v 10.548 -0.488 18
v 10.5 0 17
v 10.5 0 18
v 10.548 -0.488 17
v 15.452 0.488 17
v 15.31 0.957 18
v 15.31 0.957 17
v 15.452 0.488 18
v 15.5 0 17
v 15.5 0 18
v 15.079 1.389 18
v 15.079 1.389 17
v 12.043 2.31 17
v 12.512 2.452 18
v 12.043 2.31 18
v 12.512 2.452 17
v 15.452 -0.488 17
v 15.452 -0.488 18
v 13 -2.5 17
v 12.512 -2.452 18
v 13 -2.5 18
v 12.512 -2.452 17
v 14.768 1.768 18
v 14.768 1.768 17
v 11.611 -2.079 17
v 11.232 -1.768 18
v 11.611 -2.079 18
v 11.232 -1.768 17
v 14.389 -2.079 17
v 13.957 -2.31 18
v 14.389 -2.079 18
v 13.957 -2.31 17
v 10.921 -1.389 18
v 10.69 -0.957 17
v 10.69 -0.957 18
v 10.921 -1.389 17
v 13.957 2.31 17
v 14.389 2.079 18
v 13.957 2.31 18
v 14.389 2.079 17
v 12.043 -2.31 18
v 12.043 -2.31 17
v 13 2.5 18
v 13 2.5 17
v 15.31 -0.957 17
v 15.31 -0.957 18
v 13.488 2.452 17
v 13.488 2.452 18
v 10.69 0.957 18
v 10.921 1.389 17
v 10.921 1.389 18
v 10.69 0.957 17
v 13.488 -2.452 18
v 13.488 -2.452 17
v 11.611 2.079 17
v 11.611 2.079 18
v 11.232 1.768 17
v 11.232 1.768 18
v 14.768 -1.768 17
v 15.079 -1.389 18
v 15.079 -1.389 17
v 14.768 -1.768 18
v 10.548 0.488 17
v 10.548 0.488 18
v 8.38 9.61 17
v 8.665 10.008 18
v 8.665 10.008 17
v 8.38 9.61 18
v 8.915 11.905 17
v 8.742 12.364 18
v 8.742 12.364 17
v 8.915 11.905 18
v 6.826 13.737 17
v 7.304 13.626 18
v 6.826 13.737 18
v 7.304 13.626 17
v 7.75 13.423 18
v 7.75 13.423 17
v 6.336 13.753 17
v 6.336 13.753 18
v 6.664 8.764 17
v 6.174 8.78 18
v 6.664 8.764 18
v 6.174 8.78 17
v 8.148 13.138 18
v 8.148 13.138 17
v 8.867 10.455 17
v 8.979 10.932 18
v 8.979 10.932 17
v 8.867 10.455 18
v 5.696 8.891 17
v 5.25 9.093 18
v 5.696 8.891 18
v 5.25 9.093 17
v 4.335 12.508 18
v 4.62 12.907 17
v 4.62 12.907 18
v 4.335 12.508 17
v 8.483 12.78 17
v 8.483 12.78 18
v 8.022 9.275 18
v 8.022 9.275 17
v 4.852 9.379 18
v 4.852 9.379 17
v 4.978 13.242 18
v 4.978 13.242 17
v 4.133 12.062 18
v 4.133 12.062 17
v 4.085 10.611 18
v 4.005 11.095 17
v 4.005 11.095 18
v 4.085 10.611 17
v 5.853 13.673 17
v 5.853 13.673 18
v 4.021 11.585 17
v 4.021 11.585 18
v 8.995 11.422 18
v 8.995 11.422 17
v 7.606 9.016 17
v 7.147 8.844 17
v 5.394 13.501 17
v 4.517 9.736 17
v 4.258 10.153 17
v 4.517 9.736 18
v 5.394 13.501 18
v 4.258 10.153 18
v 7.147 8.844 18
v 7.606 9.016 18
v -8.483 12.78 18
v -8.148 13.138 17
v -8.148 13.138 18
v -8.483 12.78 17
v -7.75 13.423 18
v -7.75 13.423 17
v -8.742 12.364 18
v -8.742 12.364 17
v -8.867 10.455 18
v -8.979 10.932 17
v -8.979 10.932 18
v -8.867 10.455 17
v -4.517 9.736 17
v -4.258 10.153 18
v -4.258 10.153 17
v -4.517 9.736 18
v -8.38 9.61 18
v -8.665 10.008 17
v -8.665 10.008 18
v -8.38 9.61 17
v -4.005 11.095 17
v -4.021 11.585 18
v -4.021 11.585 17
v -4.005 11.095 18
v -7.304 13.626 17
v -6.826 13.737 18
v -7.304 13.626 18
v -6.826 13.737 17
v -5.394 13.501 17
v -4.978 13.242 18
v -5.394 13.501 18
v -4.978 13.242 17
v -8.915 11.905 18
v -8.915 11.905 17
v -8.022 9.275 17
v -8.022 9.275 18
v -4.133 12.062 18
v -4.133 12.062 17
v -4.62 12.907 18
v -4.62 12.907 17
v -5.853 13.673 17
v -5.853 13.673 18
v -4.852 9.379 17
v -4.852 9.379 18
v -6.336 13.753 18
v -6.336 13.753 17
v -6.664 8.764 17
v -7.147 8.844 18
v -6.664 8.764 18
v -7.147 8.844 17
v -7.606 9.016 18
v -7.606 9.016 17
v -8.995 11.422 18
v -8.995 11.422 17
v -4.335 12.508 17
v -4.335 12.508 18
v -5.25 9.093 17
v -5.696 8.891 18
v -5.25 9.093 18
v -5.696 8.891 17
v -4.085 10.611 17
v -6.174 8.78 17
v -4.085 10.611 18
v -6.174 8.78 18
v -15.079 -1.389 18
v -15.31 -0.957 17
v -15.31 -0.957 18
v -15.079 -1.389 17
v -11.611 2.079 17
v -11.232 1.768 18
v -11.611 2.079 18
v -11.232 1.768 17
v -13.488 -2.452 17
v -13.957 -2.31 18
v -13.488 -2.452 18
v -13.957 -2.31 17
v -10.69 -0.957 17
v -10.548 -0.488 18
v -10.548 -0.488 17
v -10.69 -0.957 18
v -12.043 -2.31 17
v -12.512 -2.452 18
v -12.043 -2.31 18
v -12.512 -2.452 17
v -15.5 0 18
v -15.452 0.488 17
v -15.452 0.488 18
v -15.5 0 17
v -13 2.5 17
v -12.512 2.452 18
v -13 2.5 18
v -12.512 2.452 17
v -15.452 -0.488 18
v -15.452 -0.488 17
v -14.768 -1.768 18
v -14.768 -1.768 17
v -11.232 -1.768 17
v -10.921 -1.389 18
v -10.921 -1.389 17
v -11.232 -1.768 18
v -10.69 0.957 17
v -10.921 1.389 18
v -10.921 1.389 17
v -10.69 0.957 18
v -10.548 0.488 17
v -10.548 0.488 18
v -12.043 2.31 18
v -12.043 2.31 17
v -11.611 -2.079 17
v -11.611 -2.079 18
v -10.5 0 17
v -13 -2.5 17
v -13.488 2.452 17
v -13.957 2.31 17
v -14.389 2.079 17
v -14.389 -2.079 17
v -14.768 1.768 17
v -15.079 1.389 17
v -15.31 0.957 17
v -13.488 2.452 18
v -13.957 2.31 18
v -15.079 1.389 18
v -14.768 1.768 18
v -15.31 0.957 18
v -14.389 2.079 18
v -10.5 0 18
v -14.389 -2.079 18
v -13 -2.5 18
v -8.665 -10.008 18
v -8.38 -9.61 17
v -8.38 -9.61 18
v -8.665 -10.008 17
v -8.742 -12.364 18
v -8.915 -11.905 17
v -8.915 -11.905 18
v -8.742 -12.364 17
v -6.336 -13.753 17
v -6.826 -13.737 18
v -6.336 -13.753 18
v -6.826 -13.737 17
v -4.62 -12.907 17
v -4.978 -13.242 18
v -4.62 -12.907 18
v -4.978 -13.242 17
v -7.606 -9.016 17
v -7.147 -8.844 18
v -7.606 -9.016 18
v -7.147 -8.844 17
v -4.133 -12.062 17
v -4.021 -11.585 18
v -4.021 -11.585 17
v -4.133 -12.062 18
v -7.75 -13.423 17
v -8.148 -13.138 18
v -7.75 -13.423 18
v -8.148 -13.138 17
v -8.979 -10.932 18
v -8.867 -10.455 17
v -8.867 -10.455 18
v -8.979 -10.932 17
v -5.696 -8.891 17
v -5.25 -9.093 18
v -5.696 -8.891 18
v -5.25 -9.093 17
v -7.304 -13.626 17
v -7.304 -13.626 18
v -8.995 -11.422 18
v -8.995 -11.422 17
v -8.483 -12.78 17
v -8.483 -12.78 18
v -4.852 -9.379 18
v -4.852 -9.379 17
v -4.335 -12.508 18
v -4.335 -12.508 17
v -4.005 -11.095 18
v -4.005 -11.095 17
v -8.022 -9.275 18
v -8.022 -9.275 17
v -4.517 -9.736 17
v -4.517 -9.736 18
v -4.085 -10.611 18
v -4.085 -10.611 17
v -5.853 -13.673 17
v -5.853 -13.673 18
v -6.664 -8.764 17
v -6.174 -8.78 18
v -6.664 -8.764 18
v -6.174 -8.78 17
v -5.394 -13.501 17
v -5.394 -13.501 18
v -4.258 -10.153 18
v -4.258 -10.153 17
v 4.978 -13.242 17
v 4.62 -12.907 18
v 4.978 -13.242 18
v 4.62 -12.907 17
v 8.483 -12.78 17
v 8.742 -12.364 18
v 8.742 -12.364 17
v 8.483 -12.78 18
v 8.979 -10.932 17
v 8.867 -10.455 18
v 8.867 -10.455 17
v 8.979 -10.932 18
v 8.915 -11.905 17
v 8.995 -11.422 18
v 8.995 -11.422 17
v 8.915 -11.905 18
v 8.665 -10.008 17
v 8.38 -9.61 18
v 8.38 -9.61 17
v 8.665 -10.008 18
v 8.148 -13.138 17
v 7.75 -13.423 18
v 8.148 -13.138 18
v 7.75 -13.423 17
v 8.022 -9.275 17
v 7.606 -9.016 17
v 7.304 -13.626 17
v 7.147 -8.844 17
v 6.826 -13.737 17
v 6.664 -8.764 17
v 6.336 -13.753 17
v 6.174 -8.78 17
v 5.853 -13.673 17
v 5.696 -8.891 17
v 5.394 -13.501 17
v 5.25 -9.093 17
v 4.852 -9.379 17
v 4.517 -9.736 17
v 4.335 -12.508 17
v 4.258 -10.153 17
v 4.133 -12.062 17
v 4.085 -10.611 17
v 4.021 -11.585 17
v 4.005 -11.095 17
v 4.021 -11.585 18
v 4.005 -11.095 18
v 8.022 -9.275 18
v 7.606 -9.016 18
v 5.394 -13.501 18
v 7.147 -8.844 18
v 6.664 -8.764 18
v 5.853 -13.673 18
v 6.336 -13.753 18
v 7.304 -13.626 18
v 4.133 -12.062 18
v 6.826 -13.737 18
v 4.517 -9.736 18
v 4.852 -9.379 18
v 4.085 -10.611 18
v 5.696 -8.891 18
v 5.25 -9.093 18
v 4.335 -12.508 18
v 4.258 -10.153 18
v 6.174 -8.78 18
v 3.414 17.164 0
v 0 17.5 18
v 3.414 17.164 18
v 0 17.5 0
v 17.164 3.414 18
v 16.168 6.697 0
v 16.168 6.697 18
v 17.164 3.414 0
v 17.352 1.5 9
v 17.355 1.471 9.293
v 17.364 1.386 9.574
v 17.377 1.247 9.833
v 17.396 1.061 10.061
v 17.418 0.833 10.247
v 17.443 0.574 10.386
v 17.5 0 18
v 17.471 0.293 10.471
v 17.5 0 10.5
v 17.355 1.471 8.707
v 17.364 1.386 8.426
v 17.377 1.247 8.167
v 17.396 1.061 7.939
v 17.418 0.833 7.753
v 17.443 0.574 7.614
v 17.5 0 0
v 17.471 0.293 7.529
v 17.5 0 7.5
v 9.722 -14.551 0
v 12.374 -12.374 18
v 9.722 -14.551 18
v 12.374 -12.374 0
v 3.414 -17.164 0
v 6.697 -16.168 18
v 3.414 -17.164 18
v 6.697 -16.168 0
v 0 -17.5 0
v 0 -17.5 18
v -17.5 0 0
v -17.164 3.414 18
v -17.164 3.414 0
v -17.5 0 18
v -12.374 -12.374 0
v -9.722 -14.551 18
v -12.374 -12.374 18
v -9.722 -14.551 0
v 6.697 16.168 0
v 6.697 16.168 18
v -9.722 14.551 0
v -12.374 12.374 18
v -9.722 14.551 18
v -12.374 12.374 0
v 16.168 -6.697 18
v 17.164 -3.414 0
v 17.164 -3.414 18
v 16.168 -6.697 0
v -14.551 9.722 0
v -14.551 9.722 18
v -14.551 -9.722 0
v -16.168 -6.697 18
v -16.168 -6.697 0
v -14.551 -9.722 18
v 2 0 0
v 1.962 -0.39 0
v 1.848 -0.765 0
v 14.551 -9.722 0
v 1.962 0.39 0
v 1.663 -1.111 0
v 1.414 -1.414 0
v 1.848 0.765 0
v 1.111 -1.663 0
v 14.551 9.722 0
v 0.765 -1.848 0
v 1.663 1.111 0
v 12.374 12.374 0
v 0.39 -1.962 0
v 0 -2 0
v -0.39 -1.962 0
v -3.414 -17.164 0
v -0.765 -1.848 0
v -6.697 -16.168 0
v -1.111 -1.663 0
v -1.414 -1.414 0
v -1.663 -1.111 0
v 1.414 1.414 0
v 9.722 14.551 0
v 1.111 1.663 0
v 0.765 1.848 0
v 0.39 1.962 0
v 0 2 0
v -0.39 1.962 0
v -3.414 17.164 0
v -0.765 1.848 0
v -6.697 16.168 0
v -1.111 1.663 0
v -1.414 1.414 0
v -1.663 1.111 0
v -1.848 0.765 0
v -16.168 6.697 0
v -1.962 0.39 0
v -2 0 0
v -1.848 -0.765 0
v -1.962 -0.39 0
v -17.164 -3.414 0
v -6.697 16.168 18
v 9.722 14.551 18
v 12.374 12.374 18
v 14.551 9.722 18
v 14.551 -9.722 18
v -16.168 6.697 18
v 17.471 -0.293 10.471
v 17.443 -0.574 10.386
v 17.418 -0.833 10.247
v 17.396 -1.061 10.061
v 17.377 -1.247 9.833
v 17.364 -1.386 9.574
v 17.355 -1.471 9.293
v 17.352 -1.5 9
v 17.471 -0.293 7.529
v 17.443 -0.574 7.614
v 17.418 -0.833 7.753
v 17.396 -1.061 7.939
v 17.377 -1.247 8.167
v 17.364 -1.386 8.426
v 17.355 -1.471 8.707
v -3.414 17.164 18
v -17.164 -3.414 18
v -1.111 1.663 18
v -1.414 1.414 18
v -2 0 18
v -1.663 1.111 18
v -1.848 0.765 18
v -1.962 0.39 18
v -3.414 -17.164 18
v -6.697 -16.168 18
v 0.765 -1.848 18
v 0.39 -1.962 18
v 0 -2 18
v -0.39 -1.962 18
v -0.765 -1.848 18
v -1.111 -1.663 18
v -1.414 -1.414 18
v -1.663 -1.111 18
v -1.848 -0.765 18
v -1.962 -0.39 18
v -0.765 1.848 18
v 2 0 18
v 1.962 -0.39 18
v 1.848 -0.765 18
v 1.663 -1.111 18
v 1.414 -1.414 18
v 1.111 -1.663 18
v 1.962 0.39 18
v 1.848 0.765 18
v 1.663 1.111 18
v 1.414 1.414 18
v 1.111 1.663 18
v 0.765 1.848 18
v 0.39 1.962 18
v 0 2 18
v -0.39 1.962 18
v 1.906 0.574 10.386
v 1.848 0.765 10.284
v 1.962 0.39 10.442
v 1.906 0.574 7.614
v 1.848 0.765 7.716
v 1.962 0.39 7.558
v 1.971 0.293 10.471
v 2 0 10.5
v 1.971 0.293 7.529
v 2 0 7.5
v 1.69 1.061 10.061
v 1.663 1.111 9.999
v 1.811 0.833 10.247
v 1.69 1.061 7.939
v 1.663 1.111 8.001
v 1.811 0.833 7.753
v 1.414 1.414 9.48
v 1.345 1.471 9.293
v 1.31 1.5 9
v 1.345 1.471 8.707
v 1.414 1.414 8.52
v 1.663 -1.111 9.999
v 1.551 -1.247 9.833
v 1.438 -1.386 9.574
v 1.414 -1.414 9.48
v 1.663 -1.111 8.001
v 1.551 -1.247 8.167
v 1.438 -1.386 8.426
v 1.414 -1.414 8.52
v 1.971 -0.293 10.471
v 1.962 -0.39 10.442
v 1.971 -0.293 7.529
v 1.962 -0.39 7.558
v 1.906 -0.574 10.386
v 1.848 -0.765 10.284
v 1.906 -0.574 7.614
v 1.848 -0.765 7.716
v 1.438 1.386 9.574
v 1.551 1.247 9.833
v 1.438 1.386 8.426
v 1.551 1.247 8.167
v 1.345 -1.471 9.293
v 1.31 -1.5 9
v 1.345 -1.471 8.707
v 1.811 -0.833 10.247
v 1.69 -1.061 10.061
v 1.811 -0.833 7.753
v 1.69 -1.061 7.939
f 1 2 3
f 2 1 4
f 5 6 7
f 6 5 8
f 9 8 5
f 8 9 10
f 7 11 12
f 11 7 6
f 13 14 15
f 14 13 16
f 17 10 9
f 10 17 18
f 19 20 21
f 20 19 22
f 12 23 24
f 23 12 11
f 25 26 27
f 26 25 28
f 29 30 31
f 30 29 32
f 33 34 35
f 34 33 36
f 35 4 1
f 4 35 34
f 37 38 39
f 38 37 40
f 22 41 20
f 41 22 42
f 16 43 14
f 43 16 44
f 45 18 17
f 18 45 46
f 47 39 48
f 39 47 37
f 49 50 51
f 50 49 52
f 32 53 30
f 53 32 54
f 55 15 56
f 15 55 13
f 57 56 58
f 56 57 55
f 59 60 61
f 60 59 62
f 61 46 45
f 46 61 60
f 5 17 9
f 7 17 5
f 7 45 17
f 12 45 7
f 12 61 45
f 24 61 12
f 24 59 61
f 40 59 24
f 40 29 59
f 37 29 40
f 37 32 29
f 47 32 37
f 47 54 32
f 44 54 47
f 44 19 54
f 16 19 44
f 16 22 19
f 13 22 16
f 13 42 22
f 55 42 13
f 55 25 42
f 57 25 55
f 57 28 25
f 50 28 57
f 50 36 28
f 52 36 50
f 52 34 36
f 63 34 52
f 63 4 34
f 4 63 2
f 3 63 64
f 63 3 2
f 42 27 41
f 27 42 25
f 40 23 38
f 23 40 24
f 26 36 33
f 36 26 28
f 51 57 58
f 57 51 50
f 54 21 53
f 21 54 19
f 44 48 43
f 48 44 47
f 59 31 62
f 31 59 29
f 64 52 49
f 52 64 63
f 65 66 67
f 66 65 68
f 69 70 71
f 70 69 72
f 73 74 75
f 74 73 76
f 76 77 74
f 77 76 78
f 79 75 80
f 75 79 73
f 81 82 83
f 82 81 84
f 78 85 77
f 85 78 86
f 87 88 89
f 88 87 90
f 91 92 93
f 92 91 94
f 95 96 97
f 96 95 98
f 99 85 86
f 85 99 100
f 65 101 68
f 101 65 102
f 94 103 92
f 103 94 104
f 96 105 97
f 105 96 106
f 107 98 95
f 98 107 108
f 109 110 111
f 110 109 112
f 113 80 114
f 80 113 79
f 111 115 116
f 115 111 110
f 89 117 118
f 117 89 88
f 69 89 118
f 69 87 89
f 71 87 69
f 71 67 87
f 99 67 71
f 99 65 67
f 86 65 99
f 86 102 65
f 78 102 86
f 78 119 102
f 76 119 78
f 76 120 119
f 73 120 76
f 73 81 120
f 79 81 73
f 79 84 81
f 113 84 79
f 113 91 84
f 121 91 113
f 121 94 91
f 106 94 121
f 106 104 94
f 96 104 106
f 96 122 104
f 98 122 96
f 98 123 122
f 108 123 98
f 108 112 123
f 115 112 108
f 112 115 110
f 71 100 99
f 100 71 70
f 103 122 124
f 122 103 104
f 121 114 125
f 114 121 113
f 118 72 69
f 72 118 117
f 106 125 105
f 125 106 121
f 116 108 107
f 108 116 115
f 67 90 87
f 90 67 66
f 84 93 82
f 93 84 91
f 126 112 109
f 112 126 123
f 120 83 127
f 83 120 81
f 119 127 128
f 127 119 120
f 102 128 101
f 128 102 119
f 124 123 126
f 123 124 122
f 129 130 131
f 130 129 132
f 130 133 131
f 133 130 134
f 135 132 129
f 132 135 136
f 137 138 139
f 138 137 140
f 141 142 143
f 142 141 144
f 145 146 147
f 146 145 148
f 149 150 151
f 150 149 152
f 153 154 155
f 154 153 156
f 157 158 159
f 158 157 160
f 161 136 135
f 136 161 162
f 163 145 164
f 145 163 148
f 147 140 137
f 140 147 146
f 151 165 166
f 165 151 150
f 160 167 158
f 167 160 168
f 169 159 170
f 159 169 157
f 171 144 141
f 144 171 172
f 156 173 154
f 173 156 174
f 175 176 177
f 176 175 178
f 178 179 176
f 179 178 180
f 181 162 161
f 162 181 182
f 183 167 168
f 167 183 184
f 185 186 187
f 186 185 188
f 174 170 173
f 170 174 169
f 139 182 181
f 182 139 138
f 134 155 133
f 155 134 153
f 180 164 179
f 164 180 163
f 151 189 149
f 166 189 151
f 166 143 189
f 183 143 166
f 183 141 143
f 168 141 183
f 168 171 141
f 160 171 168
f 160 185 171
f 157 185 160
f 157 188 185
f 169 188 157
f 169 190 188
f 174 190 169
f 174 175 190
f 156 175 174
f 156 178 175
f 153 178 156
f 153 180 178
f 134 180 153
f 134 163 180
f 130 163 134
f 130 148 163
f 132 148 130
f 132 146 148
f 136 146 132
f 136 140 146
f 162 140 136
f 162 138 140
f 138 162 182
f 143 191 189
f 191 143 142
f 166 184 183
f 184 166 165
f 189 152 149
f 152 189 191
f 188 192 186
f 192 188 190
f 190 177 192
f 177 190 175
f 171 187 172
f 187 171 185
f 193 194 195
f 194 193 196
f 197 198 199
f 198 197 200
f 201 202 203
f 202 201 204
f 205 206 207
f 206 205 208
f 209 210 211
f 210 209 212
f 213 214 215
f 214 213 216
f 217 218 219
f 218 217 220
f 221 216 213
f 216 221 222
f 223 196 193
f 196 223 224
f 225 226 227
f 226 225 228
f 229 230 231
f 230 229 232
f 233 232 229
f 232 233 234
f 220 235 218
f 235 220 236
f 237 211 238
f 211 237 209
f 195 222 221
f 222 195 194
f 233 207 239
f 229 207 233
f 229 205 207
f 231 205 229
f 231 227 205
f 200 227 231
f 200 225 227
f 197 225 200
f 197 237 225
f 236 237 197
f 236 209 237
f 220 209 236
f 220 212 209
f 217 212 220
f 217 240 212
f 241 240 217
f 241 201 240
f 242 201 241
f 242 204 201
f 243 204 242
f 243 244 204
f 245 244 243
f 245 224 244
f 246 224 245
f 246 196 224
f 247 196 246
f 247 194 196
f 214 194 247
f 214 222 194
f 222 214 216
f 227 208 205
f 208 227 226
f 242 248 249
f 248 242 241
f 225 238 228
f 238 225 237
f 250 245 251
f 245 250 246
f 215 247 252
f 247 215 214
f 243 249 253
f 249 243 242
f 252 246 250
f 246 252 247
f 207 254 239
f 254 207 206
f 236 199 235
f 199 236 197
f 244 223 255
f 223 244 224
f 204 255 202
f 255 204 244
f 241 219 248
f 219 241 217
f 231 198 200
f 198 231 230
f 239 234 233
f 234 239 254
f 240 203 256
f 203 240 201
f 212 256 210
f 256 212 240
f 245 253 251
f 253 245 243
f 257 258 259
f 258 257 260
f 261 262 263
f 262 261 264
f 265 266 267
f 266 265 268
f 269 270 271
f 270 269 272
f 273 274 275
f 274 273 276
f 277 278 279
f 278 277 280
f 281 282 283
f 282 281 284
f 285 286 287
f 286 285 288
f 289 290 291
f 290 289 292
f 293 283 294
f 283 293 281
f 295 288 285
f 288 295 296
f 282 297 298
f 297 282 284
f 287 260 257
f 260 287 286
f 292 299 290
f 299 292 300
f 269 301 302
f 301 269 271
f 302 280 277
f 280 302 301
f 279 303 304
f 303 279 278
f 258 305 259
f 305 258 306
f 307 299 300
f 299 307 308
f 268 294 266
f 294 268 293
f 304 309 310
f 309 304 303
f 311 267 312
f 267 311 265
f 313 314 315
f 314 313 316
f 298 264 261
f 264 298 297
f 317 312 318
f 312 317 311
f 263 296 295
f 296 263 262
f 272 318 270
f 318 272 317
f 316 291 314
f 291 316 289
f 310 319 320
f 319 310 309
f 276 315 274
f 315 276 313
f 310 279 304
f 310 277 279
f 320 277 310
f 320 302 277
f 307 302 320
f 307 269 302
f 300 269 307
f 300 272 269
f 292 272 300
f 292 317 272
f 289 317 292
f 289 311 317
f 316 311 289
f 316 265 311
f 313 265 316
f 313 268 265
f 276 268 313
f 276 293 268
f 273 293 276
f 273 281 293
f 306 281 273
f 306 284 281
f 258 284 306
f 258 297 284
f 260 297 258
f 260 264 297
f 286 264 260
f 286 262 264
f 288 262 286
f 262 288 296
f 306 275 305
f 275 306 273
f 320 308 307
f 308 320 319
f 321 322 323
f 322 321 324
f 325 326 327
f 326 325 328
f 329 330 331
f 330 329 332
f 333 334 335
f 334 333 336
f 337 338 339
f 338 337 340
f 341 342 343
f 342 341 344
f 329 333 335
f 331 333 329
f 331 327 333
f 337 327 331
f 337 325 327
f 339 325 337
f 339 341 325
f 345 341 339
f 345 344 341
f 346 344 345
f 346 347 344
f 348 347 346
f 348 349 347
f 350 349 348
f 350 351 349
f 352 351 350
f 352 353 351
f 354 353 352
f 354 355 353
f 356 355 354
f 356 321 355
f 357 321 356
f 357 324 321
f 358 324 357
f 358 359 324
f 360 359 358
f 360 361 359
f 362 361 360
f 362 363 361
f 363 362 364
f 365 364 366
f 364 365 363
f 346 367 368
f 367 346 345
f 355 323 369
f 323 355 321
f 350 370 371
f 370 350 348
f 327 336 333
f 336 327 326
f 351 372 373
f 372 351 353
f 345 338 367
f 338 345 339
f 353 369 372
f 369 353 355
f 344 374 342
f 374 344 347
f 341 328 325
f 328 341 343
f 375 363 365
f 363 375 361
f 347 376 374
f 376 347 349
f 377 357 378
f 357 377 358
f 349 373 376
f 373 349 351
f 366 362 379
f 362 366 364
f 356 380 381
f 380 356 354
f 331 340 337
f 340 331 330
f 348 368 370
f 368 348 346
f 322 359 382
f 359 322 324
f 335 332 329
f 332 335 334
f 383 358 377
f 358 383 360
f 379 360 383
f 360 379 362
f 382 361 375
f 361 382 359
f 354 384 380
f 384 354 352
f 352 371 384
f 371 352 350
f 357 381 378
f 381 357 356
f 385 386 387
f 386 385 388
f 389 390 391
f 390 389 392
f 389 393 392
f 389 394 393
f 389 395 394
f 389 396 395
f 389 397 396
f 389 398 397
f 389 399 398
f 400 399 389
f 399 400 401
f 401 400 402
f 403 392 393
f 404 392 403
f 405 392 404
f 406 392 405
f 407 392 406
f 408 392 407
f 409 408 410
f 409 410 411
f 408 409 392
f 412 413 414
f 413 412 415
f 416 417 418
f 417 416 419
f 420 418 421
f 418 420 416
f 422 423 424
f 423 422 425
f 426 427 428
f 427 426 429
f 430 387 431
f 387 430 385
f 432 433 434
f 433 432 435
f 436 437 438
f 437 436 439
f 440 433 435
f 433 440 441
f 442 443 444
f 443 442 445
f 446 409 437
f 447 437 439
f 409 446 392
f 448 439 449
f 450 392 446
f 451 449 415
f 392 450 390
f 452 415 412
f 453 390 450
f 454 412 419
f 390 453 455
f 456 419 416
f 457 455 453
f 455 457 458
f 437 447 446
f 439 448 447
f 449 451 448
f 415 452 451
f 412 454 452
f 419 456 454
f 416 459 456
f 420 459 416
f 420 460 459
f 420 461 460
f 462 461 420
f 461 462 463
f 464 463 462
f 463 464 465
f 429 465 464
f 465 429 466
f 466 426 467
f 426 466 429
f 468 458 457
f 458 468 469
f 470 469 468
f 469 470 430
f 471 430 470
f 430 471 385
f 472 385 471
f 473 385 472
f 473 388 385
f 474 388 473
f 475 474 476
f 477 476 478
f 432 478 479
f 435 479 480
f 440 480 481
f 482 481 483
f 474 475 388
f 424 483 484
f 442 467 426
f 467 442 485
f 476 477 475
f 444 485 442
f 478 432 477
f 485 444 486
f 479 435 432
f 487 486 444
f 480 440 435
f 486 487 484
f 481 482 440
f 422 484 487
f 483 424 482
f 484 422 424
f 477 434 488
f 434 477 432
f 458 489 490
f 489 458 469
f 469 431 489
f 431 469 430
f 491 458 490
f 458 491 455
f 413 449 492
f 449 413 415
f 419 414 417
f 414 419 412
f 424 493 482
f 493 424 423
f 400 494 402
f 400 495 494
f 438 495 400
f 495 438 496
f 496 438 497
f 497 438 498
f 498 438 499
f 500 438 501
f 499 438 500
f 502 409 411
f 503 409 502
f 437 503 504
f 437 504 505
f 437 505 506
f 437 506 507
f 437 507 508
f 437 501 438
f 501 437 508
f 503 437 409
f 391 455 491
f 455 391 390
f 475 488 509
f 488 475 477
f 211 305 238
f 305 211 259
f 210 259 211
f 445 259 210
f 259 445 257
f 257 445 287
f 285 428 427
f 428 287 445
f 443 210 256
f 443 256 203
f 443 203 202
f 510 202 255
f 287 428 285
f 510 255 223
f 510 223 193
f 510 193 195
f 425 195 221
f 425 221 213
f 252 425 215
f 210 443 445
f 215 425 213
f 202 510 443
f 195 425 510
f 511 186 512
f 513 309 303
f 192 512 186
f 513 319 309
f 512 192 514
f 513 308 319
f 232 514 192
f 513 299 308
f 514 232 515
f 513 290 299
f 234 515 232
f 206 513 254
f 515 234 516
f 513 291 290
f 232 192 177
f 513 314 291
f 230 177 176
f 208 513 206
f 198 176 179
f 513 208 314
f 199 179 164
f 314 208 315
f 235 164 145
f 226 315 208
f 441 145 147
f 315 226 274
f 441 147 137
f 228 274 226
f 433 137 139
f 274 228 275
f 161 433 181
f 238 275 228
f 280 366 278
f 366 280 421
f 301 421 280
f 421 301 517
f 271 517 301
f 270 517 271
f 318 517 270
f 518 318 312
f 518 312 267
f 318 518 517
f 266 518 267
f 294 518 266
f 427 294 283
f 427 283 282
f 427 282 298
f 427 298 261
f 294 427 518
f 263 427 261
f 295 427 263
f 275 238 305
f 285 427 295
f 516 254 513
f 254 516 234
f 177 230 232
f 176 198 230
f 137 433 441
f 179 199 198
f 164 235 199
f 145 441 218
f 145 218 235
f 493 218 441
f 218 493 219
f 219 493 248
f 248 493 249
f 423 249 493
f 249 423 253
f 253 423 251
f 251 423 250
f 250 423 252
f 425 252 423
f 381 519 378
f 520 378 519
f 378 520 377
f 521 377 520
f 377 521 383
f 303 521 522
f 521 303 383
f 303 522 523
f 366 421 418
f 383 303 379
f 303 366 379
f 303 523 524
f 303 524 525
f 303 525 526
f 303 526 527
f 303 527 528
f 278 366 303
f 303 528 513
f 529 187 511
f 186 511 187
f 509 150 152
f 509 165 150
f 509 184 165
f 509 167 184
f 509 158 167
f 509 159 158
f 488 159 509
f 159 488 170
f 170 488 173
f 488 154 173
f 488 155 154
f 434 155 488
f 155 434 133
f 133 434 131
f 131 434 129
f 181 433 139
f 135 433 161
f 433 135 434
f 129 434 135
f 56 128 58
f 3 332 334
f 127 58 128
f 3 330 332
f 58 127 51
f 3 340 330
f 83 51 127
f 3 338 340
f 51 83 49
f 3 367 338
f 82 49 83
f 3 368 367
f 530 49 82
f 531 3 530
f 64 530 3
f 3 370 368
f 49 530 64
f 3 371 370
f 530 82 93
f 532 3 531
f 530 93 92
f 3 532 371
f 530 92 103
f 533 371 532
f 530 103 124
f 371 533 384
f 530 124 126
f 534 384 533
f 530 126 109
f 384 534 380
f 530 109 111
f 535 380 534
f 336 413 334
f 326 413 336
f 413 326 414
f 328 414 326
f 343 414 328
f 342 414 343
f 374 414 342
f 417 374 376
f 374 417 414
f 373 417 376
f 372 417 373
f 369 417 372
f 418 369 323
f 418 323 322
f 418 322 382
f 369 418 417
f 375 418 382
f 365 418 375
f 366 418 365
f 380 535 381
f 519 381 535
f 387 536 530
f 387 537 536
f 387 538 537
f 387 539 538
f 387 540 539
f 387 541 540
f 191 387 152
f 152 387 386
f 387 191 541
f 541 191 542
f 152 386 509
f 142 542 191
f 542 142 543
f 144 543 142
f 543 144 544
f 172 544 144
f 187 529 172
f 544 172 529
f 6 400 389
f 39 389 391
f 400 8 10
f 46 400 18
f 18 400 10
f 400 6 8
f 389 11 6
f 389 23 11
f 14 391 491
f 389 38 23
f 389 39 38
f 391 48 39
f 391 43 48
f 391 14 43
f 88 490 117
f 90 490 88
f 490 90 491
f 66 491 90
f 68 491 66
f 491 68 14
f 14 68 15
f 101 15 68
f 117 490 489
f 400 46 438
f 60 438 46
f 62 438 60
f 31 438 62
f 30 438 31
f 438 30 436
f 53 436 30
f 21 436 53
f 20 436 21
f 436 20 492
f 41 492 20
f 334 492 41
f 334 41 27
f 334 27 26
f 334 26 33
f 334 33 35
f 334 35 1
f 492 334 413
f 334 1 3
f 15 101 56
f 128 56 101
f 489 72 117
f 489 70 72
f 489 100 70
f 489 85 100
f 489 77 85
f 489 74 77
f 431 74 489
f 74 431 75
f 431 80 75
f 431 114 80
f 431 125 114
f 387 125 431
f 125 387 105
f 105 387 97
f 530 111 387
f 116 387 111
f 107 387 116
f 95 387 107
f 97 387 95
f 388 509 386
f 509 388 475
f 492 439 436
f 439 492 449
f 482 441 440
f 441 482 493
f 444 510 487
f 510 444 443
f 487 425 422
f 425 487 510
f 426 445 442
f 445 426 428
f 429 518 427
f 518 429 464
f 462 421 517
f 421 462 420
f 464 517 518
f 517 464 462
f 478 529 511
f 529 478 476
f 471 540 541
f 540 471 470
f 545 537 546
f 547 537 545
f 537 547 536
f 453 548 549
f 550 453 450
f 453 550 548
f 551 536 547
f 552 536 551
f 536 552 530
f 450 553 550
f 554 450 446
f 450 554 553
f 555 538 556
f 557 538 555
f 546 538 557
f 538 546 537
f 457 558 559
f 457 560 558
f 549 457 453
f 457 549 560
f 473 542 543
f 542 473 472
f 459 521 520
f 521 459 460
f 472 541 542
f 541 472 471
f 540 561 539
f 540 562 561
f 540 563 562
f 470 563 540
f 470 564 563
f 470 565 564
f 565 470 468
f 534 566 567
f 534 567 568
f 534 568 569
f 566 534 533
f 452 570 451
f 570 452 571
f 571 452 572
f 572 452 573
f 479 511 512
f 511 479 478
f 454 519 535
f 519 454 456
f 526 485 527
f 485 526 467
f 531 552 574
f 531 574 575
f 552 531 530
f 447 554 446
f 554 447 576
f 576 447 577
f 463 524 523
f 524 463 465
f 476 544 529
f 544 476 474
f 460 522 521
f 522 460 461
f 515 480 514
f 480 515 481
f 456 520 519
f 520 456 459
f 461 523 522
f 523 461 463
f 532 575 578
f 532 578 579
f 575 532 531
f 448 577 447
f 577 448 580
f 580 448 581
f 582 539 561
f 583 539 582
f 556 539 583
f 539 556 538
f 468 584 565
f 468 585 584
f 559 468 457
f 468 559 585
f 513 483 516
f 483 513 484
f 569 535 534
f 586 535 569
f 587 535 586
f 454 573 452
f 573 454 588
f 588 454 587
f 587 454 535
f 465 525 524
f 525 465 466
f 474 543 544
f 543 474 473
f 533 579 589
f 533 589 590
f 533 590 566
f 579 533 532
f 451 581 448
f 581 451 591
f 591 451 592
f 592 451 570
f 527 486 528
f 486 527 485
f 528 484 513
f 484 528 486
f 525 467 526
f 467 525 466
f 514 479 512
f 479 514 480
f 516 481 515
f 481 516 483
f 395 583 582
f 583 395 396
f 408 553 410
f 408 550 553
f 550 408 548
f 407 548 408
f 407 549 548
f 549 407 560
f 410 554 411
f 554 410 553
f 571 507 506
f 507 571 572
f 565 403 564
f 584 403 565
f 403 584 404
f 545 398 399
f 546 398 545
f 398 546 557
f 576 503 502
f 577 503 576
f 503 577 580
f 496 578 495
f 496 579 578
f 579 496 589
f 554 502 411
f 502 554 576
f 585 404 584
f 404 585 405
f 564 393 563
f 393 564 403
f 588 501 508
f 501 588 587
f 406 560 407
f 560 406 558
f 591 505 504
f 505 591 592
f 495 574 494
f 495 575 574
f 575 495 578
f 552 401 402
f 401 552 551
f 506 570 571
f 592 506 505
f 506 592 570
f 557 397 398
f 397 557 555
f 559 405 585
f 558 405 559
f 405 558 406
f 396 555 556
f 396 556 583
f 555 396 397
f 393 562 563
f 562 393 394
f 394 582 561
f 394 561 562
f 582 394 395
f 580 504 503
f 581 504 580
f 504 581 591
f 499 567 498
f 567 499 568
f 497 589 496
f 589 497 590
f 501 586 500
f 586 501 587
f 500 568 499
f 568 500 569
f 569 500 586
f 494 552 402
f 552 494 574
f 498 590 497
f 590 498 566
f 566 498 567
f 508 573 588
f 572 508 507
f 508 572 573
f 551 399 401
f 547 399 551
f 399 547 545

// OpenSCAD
$fn = 32;

// ----------------------------------------------------------------------
// Control knob: dimpled knob
// ----------------------------------------------------------------------

// --- parameters (mm) ---
dimp_d = 5;               // finger dimple diameter
n_dimp = 6;               // number of dimples
dimp_r = 13;              // dimple ring radius
knob_d = 35;              // knob body diameter
knob_h = 18;              // knob body height
bore_d = 4;               // shaft bore diameter
set_d = 3;                // set screw bore diameter

dimp_step = 360 / n_dimp;  // dimple angular step

difference() {
  cylinder(h = knob_h, d = knob_d);
  translate([0, 0, -1]) cylinder(h = knob_h + 2, d = bore_d);
  translate([-1, 0, knob_h / 2]) rotate([0, 90, 0])
    cylinder(h = knob_d / 2 + bore_d / 2 + 2, d = set_d);  for (i = [0 : n_dimp - 1])
    rotate([0, 0, i * dimp_step])
      translate([dimp_r, 0, knob_h - 1])
        cylinder(h = 2, d = dimp_d);
}
